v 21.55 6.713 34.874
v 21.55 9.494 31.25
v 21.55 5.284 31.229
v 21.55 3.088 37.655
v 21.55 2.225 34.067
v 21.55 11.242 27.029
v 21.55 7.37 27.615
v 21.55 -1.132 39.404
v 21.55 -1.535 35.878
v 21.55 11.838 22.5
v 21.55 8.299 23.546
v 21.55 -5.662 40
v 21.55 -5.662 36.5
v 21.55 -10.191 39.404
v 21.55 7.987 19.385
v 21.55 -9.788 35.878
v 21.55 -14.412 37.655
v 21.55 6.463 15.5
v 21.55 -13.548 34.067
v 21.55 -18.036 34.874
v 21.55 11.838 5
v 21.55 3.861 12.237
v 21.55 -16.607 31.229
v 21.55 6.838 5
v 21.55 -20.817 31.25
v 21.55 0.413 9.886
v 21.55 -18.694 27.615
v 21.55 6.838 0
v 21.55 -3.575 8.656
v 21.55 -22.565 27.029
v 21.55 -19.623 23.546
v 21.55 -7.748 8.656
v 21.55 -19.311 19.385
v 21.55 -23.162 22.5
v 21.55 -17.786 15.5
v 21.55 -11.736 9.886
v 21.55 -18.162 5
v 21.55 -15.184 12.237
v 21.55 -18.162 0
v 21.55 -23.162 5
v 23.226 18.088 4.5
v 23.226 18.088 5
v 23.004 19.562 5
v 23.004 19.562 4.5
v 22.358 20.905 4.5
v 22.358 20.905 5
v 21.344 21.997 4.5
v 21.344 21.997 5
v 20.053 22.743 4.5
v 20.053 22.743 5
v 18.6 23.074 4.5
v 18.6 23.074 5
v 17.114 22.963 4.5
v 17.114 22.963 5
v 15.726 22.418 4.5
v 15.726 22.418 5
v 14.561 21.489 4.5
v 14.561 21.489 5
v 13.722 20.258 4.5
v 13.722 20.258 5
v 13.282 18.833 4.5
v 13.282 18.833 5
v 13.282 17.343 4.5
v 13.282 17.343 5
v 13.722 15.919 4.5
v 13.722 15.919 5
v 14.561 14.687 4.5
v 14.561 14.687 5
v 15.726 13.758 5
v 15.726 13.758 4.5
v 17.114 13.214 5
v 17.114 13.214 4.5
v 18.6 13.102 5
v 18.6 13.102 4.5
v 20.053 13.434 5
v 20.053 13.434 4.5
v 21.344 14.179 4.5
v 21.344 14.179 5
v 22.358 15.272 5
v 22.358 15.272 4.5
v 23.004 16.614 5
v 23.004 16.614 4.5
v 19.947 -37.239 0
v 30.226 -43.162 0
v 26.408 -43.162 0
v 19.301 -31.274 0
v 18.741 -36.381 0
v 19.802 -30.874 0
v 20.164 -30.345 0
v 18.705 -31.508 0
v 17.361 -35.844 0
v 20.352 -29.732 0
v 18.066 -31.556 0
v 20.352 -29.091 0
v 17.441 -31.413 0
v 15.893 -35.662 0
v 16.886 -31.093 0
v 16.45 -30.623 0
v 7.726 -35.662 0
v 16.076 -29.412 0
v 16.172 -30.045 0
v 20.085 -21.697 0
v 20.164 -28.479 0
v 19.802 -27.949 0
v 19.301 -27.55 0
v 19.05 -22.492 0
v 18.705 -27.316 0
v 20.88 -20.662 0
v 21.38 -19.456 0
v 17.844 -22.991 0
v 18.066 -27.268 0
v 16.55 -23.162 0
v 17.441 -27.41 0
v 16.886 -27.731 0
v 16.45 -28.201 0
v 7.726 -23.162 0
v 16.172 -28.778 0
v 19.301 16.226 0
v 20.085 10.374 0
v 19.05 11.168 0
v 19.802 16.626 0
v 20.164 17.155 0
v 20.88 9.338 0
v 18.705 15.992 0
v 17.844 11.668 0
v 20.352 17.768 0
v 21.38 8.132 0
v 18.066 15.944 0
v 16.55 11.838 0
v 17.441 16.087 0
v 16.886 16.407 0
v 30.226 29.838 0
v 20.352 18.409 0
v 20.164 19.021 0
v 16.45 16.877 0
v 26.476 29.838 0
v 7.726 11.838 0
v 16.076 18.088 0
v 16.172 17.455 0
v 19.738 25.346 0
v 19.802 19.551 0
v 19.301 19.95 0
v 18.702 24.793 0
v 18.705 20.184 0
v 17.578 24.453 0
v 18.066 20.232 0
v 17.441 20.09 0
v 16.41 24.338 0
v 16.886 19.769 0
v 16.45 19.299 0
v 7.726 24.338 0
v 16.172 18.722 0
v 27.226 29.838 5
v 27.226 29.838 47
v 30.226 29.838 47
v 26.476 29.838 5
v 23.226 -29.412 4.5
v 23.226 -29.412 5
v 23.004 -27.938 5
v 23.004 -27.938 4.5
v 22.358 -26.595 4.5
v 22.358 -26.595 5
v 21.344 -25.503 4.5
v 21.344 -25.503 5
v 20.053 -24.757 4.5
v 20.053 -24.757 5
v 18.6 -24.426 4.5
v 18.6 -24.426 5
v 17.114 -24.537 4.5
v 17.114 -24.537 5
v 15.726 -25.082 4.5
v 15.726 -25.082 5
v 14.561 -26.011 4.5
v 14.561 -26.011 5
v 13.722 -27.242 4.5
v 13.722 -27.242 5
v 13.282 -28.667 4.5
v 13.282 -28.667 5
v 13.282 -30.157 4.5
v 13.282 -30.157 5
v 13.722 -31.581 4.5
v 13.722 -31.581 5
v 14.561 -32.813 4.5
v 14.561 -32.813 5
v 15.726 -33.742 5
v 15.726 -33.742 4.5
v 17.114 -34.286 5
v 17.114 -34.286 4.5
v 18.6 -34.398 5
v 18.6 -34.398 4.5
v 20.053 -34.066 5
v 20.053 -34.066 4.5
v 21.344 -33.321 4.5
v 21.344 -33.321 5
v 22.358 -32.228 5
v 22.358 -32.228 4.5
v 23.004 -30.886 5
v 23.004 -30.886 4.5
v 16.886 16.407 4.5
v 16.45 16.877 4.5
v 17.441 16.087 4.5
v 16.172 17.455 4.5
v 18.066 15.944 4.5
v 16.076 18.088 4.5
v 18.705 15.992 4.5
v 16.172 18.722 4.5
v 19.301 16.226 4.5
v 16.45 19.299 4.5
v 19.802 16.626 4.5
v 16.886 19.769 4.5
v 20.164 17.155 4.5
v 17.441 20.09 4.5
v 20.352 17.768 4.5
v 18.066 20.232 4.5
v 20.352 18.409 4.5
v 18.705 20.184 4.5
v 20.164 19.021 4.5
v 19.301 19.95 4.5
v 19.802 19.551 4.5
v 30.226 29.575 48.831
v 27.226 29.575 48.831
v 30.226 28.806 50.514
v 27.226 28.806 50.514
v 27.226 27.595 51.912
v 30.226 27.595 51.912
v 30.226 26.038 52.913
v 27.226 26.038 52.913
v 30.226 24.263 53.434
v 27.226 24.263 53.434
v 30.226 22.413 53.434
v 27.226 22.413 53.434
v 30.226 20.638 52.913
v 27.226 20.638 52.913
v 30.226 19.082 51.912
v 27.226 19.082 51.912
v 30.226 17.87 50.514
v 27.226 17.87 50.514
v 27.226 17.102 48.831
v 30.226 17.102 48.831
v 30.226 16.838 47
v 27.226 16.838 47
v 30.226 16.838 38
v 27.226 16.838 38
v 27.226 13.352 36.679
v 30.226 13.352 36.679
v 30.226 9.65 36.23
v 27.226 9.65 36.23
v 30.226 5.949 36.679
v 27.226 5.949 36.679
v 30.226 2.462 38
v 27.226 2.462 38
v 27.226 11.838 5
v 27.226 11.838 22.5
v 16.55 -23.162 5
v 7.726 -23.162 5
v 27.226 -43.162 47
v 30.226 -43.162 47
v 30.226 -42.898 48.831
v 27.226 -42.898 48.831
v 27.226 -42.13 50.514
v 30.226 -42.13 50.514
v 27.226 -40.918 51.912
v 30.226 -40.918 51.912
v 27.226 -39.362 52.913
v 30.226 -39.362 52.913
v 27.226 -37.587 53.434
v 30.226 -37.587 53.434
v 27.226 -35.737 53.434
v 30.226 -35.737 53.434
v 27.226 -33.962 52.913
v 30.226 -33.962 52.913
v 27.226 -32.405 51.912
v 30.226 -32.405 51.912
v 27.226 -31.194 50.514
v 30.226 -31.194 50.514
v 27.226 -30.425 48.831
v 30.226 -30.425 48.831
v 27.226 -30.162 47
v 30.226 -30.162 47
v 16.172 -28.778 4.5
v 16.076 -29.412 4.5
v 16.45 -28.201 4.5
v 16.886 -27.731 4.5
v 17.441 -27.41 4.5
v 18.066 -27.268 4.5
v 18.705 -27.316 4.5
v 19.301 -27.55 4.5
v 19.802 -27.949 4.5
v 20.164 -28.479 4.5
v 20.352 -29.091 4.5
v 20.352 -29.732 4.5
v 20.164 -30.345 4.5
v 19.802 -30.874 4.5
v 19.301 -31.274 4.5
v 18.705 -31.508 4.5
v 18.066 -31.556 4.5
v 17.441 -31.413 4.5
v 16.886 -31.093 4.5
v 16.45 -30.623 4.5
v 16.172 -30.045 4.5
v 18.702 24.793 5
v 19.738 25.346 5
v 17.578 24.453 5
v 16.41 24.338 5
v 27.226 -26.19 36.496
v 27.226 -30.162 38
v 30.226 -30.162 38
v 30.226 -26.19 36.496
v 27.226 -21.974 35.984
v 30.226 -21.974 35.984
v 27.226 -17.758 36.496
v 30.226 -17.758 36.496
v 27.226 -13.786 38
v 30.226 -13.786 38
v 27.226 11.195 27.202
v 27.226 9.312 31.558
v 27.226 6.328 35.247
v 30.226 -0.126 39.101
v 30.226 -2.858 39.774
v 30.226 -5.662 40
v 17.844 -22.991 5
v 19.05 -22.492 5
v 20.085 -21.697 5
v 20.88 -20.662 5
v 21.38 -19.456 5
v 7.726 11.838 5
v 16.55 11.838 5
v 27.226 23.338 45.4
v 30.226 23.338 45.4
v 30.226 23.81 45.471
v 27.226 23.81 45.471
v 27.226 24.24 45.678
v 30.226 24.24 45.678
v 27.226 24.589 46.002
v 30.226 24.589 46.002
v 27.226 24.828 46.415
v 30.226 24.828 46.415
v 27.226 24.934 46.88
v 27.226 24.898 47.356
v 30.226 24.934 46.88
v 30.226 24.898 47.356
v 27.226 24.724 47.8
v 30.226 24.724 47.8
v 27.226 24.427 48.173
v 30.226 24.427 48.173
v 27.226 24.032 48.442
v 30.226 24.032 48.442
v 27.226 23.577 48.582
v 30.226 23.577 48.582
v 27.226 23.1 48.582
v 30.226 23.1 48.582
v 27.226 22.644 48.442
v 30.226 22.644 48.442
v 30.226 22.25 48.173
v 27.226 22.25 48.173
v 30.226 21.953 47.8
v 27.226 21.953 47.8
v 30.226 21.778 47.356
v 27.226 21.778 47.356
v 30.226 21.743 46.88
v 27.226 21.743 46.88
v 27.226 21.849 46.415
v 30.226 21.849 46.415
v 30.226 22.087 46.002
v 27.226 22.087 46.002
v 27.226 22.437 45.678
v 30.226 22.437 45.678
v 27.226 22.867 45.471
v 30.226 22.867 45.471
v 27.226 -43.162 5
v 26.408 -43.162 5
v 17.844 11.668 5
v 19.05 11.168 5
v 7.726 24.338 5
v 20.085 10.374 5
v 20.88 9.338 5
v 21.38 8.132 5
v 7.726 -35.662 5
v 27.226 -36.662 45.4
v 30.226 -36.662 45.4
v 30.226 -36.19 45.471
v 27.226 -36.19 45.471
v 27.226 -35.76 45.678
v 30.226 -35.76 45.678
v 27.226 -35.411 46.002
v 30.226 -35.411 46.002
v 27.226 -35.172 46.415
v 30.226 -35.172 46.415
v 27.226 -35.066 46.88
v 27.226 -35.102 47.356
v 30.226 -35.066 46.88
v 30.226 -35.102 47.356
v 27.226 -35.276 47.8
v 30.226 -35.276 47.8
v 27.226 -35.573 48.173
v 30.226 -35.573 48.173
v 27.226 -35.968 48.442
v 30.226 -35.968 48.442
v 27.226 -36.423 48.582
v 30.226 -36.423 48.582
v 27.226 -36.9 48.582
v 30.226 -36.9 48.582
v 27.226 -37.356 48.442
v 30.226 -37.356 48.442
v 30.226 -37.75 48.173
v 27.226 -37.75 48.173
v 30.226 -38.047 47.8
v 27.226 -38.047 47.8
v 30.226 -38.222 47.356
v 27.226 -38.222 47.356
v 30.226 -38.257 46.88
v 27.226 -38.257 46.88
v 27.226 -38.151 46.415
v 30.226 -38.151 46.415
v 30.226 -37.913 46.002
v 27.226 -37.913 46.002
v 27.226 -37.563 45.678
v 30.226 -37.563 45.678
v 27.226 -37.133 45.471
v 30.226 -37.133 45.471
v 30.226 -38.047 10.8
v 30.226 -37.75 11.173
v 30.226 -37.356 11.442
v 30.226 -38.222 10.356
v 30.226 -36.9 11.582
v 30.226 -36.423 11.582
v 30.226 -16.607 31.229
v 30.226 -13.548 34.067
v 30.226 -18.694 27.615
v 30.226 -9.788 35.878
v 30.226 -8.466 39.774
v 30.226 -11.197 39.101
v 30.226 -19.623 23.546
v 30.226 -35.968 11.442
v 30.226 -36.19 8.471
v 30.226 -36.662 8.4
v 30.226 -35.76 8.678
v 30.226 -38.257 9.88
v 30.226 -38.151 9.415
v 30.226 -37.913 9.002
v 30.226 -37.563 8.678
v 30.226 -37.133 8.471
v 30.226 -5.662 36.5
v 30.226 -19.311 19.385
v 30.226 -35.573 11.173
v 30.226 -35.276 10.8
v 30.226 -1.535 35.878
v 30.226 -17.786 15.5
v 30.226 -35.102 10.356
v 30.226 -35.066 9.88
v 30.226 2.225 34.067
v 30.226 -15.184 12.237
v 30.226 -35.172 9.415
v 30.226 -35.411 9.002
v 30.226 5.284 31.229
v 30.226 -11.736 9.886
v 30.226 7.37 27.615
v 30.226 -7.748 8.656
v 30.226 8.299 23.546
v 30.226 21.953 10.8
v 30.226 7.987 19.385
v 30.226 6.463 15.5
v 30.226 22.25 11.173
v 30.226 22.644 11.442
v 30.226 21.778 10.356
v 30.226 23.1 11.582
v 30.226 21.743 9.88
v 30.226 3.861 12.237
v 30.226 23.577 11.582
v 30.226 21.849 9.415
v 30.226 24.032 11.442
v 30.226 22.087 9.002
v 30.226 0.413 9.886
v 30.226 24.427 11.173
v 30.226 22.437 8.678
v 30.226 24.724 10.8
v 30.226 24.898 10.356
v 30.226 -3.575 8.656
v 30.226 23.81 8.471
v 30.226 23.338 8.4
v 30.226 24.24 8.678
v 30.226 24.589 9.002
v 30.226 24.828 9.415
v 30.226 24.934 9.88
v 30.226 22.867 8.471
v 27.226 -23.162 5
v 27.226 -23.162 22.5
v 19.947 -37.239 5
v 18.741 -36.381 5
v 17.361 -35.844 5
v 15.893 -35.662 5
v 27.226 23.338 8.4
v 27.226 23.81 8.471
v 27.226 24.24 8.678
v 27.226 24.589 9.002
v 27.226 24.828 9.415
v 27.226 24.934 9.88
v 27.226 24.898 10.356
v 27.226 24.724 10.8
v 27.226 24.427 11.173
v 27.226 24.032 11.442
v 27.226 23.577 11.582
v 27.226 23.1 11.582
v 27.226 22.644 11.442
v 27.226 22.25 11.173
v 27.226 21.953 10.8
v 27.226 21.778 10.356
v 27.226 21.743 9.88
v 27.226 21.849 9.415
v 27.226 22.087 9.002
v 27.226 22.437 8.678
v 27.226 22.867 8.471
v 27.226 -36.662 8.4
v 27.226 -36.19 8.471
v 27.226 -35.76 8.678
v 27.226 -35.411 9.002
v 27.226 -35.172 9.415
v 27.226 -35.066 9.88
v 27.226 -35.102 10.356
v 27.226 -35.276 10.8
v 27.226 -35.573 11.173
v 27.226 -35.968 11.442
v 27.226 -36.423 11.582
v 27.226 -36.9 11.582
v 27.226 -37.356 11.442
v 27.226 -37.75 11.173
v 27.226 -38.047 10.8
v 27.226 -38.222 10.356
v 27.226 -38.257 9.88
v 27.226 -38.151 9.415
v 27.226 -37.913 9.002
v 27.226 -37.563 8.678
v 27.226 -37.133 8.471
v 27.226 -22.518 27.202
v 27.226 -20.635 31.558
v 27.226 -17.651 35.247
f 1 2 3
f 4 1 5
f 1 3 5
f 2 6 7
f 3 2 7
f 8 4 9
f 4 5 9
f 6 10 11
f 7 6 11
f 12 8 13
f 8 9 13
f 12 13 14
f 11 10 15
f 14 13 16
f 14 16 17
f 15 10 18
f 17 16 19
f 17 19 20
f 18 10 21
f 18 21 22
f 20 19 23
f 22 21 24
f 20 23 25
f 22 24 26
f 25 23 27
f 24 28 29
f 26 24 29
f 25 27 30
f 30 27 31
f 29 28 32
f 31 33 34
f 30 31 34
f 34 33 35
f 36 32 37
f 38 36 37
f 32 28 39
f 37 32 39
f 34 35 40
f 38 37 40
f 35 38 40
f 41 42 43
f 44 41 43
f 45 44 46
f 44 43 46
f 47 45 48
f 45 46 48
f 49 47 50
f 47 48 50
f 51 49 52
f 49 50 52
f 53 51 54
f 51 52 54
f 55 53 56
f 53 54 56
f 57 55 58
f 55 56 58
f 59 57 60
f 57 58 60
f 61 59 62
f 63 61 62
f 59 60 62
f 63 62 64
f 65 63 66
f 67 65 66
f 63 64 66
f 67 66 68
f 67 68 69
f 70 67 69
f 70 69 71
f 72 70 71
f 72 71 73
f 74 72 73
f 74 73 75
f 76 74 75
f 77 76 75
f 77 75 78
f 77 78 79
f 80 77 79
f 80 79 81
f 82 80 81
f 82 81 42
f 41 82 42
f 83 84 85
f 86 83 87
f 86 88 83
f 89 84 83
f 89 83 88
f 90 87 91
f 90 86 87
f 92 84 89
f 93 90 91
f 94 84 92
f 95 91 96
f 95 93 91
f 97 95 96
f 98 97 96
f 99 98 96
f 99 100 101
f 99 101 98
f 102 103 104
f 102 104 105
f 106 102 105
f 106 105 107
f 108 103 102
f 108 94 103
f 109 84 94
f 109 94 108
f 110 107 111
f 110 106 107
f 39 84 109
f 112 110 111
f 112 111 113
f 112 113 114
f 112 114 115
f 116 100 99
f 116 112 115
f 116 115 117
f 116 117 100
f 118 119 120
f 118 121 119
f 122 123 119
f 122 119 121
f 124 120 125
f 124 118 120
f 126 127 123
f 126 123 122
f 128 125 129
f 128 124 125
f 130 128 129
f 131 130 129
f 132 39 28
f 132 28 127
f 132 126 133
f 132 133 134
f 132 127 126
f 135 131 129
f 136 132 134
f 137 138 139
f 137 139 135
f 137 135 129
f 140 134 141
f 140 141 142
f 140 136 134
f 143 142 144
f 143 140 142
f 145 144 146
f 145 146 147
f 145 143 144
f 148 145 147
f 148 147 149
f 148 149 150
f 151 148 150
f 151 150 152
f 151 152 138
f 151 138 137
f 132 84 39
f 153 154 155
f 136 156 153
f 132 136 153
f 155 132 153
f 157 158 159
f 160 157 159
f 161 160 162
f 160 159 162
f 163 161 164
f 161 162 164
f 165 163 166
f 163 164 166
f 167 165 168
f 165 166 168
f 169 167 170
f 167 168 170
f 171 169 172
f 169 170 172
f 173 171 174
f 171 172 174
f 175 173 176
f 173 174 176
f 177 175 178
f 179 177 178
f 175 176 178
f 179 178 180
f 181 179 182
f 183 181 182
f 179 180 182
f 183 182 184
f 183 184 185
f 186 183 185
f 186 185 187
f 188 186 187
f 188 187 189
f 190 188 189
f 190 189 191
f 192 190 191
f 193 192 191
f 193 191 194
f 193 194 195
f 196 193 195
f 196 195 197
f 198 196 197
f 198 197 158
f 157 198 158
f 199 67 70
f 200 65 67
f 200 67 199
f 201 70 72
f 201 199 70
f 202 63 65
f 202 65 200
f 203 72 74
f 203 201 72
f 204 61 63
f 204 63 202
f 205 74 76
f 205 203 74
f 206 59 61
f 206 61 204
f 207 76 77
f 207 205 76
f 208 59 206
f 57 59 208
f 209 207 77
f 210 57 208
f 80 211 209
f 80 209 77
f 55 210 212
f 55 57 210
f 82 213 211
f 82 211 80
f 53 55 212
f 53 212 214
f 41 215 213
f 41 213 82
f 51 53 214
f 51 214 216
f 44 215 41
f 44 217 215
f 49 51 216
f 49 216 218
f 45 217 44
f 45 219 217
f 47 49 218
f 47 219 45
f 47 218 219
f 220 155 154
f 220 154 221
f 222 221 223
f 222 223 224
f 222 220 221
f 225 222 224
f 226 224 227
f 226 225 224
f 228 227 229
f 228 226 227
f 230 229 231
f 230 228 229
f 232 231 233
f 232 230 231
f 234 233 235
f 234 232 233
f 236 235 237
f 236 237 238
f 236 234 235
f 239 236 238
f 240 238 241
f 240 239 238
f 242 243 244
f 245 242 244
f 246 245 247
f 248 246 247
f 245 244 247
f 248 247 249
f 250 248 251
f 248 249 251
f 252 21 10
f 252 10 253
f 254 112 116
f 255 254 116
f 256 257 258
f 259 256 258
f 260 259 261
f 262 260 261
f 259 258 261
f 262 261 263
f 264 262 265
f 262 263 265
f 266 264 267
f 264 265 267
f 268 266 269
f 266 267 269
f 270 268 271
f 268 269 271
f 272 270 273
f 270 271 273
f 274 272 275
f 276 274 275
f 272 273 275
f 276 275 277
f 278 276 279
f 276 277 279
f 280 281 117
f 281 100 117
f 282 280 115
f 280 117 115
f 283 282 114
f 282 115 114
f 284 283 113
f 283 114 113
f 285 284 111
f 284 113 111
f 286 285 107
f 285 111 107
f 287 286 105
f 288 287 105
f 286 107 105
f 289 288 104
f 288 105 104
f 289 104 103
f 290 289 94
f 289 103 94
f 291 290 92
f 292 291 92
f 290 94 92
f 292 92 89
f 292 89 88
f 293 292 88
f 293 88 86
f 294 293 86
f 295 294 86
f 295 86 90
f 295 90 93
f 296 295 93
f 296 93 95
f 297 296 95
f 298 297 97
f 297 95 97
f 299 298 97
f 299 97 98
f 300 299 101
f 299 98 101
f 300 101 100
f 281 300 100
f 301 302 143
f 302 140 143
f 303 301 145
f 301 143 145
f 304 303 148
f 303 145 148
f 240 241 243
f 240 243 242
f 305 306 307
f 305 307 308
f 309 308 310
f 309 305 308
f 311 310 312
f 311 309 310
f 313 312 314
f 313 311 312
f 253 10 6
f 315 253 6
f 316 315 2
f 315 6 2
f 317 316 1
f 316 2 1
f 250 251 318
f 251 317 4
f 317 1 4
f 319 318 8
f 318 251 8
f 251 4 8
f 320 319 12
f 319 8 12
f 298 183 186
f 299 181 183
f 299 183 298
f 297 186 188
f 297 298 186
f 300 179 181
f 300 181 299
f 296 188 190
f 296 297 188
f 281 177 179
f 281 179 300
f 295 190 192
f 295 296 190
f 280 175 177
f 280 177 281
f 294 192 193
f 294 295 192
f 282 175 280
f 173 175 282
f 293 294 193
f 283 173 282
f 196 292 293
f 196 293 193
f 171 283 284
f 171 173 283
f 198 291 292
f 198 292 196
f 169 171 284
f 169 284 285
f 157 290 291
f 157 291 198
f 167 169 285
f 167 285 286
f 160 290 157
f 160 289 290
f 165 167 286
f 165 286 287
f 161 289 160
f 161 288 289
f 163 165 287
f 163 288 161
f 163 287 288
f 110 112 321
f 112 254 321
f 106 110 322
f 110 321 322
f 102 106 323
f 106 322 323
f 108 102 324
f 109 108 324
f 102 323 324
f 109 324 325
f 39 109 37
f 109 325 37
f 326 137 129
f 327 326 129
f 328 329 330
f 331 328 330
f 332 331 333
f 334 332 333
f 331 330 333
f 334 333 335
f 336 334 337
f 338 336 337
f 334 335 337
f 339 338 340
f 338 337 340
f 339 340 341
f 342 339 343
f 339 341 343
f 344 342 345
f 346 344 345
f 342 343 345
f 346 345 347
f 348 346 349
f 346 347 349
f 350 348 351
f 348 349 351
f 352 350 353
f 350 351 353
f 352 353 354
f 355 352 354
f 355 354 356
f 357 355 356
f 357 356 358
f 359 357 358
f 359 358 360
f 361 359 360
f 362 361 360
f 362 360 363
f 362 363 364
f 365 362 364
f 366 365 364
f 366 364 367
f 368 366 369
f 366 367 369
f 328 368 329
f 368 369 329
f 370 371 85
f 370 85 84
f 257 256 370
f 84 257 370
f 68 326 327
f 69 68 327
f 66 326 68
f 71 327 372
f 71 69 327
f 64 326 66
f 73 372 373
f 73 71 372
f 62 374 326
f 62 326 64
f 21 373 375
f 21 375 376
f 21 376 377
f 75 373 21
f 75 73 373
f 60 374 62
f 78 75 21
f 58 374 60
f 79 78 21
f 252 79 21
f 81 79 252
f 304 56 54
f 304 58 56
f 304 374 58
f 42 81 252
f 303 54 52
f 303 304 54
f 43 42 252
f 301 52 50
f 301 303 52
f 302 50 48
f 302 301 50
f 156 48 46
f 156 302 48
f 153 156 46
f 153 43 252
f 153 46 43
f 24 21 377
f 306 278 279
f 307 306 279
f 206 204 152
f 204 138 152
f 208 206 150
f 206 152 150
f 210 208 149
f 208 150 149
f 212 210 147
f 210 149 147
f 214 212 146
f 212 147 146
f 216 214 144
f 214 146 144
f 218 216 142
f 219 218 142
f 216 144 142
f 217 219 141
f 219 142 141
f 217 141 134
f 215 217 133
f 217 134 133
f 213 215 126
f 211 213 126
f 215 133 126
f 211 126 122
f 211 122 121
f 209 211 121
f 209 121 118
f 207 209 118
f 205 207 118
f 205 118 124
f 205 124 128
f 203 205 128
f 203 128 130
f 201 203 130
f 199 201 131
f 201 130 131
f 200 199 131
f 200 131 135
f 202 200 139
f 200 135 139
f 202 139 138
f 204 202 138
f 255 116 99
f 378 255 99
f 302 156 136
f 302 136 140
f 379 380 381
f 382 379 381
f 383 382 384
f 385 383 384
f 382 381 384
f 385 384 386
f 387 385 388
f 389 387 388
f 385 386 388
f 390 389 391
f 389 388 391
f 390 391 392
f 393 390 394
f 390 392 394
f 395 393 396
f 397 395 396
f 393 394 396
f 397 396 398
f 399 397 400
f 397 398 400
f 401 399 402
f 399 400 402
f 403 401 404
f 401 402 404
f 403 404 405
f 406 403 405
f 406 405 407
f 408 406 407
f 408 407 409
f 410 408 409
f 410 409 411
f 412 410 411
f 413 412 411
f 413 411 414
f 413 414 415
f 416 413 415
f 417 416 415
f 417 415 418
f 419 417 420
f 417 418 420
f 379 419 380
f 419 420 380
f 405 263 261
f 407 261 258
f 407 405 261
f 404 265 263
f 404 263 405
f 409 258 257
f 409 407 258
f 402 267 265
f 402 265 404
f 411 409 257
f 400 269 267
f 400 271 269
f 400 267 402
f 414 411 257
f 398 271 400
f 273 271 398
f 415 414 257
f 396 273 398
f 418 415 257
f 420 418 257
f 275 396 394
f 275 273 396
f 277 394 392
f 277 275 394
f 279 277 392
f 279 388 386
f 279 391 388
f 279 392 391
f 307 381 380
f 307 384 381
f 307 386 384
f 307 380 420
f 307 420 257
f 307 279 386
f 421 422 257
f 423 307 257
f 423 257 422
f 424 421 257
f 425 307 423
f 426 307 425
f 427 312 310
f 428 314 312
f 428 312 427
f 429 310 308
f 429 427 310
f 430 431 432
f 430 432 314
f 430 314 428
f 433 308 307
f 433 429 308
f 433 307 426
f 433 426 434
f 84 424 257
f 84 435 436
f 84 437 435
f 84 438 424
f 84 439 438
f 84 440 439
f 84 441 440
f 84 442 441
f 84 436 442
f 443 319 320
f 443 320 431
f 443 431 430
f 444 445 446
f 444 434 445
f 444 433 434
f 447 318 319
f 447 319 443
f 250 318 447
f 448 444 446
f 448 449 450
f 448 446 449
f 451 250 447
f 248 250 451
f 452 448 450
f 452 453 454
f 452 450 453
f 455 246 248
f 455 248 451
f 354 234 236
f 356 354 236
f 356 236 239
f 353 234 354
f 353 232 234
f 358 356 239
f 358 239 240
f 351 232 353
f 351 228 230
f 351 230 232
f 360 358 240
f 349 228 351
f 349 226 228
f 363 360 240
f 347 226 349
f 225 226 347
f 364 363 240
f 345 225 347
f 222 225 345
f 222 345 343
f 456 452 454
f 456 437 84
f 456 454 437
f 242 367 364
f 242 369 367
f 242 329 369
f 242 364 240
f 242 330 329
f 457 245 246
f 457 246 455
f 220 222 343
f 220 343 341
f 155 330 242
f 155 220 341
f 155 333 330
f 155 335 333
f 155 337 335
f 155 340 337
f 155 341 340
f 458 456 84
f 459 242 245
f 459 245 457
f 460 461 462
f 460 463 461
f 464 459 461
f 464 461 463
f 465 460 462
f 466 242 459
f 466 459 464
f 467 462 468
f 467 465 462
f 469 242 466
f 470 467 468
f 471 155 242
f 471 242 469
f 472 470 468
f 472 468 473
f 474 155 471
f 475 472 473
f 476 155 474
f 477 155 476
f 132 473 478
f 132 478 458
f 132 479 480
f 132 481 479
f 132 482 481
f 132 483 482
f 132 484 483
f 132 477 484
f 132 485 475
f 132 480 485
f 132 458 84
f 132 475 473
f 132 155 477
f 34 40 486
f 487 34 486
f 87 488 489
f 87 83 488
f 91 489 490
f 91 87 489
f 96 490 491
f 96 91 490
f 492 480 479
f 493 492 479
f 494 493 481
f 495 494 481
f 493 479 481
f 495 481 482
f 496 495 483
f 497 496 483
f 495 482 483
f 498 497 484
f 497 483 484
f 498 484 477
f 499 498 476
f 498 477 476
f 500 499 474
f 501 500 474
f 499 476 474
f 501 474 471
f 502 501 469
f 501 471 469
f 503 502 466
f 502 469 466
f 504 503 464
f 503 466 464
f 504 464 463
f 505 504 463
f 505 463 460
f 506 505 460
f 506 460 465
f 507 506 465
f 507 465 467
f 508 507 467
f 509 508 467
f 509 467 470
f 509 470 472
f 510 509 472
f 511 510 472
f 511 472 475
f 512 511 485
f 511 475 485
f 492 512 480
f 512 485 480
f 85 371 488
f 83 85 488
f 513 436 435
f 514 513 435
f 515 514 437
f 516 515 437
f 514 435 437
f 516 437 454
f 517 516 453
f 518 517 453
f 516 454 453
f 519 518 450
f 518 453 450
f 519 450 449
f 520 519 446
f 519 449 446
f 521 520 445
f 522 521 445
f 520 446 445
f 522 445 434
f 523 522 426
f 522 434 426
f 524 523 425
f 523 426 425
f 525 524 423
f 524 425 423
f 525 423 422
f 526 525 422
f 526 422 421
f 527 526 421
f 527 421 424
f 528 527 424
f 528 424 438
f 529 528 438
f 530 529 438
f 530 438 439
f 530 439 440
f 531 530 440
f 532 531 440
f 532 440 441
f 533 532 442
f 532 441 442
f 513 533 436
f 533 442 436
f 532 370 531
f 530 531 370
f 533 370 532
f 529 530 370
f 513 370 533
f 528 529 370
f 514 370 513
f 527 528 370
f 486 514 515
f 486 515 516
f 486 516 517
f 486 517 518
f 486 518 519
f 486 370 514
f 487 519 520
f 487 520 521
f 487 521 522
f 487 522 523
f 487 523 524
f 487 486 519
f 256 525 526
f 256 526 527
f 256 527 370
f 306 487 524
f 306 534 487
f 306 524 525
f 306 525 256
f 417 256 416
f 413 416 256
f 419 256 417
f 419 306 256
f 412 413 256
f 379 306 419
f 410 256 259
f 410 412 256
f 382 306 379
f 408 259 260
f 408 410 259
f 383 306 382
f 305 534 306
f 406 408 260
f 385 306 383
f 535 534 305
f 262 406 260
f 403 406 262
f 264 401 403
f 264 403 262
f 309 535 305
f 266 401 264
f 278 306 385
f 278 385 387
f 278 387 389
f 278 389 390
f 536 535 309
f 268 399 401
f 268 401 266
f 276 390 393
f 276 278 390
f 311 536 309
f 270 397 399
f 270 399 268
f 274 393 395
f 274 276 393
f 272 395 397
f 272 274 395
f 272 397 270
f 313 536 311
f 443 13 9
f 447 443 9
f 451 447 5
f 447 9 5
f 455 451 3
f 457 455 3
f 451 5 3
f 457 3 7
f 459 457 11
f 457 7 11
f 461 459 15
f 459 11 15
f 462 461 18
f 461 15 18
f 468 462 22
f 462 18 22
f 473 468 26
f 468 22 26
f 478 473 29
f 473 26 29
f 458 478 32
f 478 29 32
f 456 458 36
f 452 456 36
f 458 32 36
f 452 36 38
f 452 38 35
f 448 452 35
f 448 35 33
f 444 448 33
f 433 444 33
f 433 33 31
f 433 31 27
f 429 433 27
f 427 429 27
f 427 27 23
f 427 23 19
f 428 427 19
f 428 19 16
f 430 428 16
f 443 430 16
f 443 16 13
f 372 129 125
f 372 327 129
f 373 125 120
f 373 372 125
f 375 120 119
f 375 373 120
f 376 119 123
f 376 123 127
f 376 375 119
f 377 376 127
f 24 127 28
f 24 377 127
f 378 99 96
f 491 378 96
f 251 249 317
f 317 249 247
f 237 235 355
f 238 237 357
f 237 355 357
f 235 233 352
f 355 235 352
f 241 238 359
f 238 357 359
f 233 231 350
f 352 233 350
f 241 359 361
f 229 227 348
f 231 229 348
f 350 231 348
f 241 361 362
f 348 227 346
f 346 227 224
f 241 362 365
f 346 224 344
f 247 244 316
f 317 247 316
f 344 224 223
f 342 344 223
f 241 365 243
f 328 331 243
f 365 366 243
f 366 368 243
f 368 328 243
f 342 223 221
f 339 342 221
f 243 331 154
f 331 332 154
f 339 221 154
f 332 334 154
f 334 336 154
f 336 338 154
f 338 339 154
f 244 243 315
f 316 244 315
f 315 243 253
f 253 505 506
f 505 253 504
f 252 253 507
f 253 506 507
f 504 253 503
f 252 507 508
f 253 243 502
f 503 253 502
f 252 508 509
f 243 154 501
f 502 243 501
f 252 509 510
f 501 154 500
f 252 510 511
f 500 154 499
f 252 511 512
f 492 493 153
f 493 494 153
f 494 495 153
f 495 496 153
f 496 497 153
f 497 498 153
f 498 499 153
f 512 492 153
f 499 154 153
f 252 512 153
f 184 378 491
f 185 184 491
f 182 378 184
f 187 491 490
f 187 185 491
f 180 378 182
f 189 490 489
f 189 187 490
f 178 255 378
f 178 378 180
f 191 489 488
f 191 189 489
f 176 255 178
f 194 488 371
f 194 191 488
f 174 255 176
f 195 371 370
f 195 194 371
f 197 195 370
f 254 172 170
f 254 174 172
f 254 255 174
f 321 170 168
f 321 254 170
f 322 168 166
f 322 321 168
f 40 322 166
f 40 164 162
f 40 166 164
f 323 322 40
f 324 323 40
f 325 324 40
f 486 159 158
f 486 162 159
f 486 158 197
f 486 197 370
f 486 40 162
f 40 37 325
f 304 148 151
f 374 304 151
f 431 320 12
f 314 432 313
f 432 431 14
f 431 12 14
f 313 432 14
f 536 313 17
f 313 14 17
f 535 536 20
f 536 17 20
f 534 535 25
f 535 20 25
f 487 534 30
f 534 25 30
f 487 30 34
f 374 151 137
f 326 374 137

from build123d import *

# Parameters (mm, degrees)
EXTRUDE_2_DEPTH                = 5
SKETCH_4_W                     = 8.676470589
SKETCH_4_H                     = 35
SKETCH_4_W_2                   = 8.676470588
EXTRUDE_15_DEPTH               = 35
CUT_EXTRUDE_1_DEPTH            = 45
SKETCH_6_R                     = 14
CUT_EXTRUDE_2_DEPTH            = 45
FILLET_1_R                     = 5
SKETCH_7_R                     = 15
SKETCH_7_R_2                   = 13
EXTRUDE_16_DEPTH               = 1
SPLIT_BODIES_1_SURFACE_1_BACK  = 86
SPLIT_BODIES_1_SURFACE_1_DEPTH = 172
SPLIT_BODIES_1_SURFACE_2_BACK  = 86
SPLIT_BODIES_1_SURFACE_2_DEPTH = 172
SKETCH_17_W                    = 3
SKETCH_17_H                    = 13
EXTRUDE_20_DEPTH               = 42
EXTRUDE_21_DEPTH               = 3
SKETCH_19_R                    = 1.6
CUT_EXTRUDE_3_DEPTH            = 3
EXTRUDE_22_DEPTH               = 5
EXTRUDE_START                  = -3
EXTRUDE_25_DEPTH               = 3
HOLE_WIZARD_1_D                = 4.3
HOLE_WIZARD_1_DEPTH            = 5
HOLE_WIZARD_1_CBORE_D          = 10
HOLE_WIZARD_1_CBORE_DEPTH      = 0.5
HOLE_WIZARD_1_TIP              = 1.291850331
FILLET_2_R                     = 6


with BuildPart() as part:
    # 草图2 → 凸台-拉伸2 (new body)
    with BuildSketch(Plane.XY):
        Polygon((7.726423565, 24.338235294), (-14.773576435, 24.338235294), (-14.773576435, -35.661764706), (7.726423565, -35.661764706), (7.726423565, -23.161764706), (-6.097105846, -23.161764706), (-6.097105846, 11.838235294), (7.726423565, 11.838235294), align=None)
        Polygon((30.226423565, 24.338235294), (7.726423565, 24.338235294), (7.726423565, 11.838235294), (21.549952977, 11.838235294), (21.549952977, -23.161764706), (7.726423565, -23.161764706), (7.726423565, -35.661764706), (30.226423565, -35.661764706), align=None)
    extrude(amount=EXTRUDE_2_DEPTH)

    # 草图4 → 凸台-拉伸15 (add)
    with BuildSketch(Plane.XY.offset(5)):
        with Locations((-10.435341141, -5.661764706)):
            Rectangle(SKETCH_4_W, SKETCH_4_H)
        with Locations((25.888188271, -5.661764706)):
            Rectangle(SKETCH_4_W_2, SKETCH_4_H)
    extrude(amount=EXTRUDE_15_DEPTH)

    # 草图5 → 切除-拉伸1 (cut)
    with BuildSketch(Plane.ZY.offset(14.773576435)):
        with BuildLine():
            Line((40, -23.161764706), (40, -5.661764706))
            ThreePointArc((40, -5.661764706), (34.874368671, -18.036133377), (22.5, -23.161764706))
            Line((22.5, -23.161764706), (40, -23.161764706))
        make_face()
        with BuildLine():
            ThreePointArc((22.5, 11.838235294), (34.874368671, 6.712603965), (40, -5.661764706))
            Line((40, -5.661764706), (40, 11.838235294))
            Line((40, 11.838235294), (22.5, 11.838235294))
        make_face()
    extrude(amount=-CUT_EXTRUDE_1_DEPTH, mode=Mode.SUBTRACT)

    # 草图6 → 切除-拉伸2 (cut)
    with BuildSketch(Plane.ZY.offset(14.773576435)):
        with Locations((22.5, -5.661764706)):
            Circle(SKETCH_6_R)
    extrude(amount=-CUT_EXTRUDE_2_DEPTH, mode=Mode.SUBTRACT)

    # 圆角1
    fillet_1_edges = [part.edges().sort_by_distance(p)[0] for p in [
        (-6.097105846, 11.838235294, 2.5),
        (-6.097105846, -23.161764706, 2.5),
        (21.549952977, -23.161764706, 2.5),
        (21.549952977, 11.838235294, 2.5),
    ]]
    fillet(fillet_1_edges, radius=FILLET_1_R)

    # 草图7 → 凸台-拉伸16 (add)
    with BuildSketch(Plane(origin=(-6.097105846, 0, 0), x_dir=(0, 0, -1), z_dir=(1, 0, 0))):
        with Locations((-22.5, -5.661764706)):
            Circle(SKETCH_7_R)
        with Locations((-22.5, -5.661764706)):
            Circle(SKETCH_7_R_2, mode=Mode.SUBTRACT)
    extrude(amount=-EXTRUDE_16_DEPTH)


with BuildPart() as body_2:
    # Split Bodies 1: the piece behind the surface
    add(part.part)
    # Split Bodies 1 surface: a surface, the sketch's curves swept straight by 172 mm
    with BuildLine(Plane.XY.offset(5).offset(-SPLIT_BODIES_1_SURFACE_1_BACK), mode=Mode.PRIVATE) as split_bodies_1_surface_1_path:
        Line((7.726423565, 24.338235294), (7.726423565, -35.661764706))
    split_bodies_1_surface_1 = Shell.extrude(split_bodies_1_surface_1_path.wire(), (0 * SPLIT_BODIES_1_SURFACE_1_DEPTH, 0 * SPLIT_BODIES_1_SURFACE_1_DEPTH, 1 * SPLIT_BODIES_1_SURFACE_1_DEPTH))
    split(bisect_by=split_bodies_1_surface_1, keep=Keep.BOTTOM)


with BuildPart() as part_1:
    add(part.part)

    # Split Bodies 1: split by a surface, the side it looks to stays
    # Split Bodies 1 surface: a surface, the sketch's curves swept straight by 172 mm
    with BuildLine(Plane.XY.offset(5).offset(-SPLIT_BODIES_1_SURFACE_2_BACK), mode=Mode.PRIVATE) as split_bodies_1_surface_2_path:
        Line((7.726423565, 24.338235294), (7.726423565, -35.661764706))
    split_bodies_1_surface_2 = Shell.extrude(split_bodies_1_surface_2_path.wire(), (0 * SPLIT_BODIES_1_SURFACE_2_DEPTH, 0 * SPLIT_BODIES_1_SURFACE_2_DEPTH, 1 * SPLIT_BODIES_1_SURFACE_2_DEPTH))
    split(bisect_by=split_bodies_1_surface_2, keep=Keep.TOP)

    # 草图17 → 凸台-拉伸20 (add)
    with BuildSketch(Plane.XY.offset(5)):
        with Locations((28.726423565, -36.661764706)):
            Rectangle(SKETCH_17_W, SKETCH_17_H)
        with Locations((28.726423565, 23.338235294)):
            Rectangle(SKETCH_17_W, SKETCH_17_H)
    extrude(amount=EXTRUDE_20_DEPTH)

    # 草图18 → 凸台-拉伸21 (add)
    with BuildSketch(Plane(origin=(30.226423565, 0, 0), x_dir=(0, 0, -1), z_dir=(1, 0, 0))):
        with BuildLine():
            Line((-47, -30.161764706), (-47, -43.161764706))
            ThreePointArc((-47, -43.161764706), (-53.5, -36.661764706), (-47, -30.161764706))
        make_face()
        with BuildLine():
            Line((-47, 16.838235294), (-47, 29.838235294))
            ThreePointArc((-47, 29.838235294), (-53.5, 23.338235294), (-47, 16.838235294))
        make_face()
    extrude(amount=-EXTRUDE_21_DEPTH)

    # 草图19 → 切除-拉伸3 (cut)
    with BuildSketch(Plane(origin=(30.226423565, 0, 0), x_dir=(0, 0, -1), z_dir=(1, 0, 0))):
        with Locations((-47, 23.338235294)):
            Circle(SKETCH_19_R)
        with Locations((-47, -36.661764706)):
            Circle(SKETCH_19_R)
        with Locations((-10, 23.338235294)):
            Circle(SKETCH_19_R)
        with Locations((-10, -36.661764706)):
            Circle(SKETCH_19_R)
    extrude(amount=-CUT_EXTRUDE_3_DEPTH, mode=Mode.SUBTRACT)

    # 草图21 → 凸台-拉伸22 (add)
    with BuildSketch(Plane.XY.offset(5)):
        Polygon((18.226423565, -35.661764706), (30.226423565, -35.661764706), (30.226423565, -43.161764706), (27.226423565, -43.161764706), (26.408241747, -43.161764706), align=None)
        Polygon((18.226423565, 24.338235294), (30.226423565, 24.338235294), (30.226423565, 29.838235294), (26.476423565, 29.838235294), align=None)
    extrude(amount=-EXTRUDE_22_DEPTH)

    # 草图24 → 凸台-拉伸25 (add)
    with BuildSketch(Plane(origin=(30.226423565, 0, 0), x_dir=(0, 0, -1), z_dir=(1, 0, 0)).offset(EXTRUDE_START)):
        with BuildLine():
            Line((-5, 16.838235294), (-38, 16.838235294))
            ThreePointArc((-38, 16.838235294), (-36.230441453, 9.650254496), (-38, 2.462273699))
            ThreePointArc((-38, 2.462273699), (-31.557574949, 9.311890026), (-22.5, 11.838235294))
            Line((-22.5, 11.838235294), (-5, 11.838235294))
            Line((-5, 11.838235294), (-5, 16.838235294))
        make_face()
        with BuildLine():
            Line((-5, -30.161764706), (-38, -30.161764706))
            ThreePointArc((-38, -30.161764706), (-35.984258471, -21.973783908), (-38, -13.785803111))
            ThreePointArc((-38, -13.785803111), (-31.557574949, -20.635419438), (-22.5, -23.161764706))
            Line((-22.5, -23.161764706), (-5, -23.161764706))
            Line((-5, -23.161764706), (-5, -30.161764706))
        make_face()
    extrude(amount=EXTRUDE_25_DEPTH)

    # 打孔尺寸(%根据六角头螺)栓 全螺纹的类型1
    with Locations(Plane(origin=(18.226423565, 18.088235294, 5), x_dir=(1, 0, 0), z_dir=(0, 0, 1))):
        with Locations((0, 0), (0, -47.5)):
            CounterBoreHole(HOLE_WIZARD_1_D / 2, HOLE_WIZARD_1_CBORE_D / 2, HOLE_WIZARD_1_CBORE_DEPTH, depth=HOLE_WIZARD_1_DEPTH)
            with Locations((0, 0, -(HOLE_WIZARD_1_DEPTH + HOLE_WIZARD_1_TIP / 2))):  # 118° drill point
                Cone(0, HOLE_WIZARD_1_D / 2, HOLE_WIZARD_1_TIP, mode=Mode.SUBTRACT)

    # 圆角2
    fillet_2_edges = [part_1.edges().sort_by_distance(p)[0] for p in [
        (18.226423565, -35.661764706, 2.5),
        (18.226423565, 24.338235294, 2.5),
    ]]
    fillet(fillet_2_edges, radius=FILLET_2_R)


solid = part_1.part
